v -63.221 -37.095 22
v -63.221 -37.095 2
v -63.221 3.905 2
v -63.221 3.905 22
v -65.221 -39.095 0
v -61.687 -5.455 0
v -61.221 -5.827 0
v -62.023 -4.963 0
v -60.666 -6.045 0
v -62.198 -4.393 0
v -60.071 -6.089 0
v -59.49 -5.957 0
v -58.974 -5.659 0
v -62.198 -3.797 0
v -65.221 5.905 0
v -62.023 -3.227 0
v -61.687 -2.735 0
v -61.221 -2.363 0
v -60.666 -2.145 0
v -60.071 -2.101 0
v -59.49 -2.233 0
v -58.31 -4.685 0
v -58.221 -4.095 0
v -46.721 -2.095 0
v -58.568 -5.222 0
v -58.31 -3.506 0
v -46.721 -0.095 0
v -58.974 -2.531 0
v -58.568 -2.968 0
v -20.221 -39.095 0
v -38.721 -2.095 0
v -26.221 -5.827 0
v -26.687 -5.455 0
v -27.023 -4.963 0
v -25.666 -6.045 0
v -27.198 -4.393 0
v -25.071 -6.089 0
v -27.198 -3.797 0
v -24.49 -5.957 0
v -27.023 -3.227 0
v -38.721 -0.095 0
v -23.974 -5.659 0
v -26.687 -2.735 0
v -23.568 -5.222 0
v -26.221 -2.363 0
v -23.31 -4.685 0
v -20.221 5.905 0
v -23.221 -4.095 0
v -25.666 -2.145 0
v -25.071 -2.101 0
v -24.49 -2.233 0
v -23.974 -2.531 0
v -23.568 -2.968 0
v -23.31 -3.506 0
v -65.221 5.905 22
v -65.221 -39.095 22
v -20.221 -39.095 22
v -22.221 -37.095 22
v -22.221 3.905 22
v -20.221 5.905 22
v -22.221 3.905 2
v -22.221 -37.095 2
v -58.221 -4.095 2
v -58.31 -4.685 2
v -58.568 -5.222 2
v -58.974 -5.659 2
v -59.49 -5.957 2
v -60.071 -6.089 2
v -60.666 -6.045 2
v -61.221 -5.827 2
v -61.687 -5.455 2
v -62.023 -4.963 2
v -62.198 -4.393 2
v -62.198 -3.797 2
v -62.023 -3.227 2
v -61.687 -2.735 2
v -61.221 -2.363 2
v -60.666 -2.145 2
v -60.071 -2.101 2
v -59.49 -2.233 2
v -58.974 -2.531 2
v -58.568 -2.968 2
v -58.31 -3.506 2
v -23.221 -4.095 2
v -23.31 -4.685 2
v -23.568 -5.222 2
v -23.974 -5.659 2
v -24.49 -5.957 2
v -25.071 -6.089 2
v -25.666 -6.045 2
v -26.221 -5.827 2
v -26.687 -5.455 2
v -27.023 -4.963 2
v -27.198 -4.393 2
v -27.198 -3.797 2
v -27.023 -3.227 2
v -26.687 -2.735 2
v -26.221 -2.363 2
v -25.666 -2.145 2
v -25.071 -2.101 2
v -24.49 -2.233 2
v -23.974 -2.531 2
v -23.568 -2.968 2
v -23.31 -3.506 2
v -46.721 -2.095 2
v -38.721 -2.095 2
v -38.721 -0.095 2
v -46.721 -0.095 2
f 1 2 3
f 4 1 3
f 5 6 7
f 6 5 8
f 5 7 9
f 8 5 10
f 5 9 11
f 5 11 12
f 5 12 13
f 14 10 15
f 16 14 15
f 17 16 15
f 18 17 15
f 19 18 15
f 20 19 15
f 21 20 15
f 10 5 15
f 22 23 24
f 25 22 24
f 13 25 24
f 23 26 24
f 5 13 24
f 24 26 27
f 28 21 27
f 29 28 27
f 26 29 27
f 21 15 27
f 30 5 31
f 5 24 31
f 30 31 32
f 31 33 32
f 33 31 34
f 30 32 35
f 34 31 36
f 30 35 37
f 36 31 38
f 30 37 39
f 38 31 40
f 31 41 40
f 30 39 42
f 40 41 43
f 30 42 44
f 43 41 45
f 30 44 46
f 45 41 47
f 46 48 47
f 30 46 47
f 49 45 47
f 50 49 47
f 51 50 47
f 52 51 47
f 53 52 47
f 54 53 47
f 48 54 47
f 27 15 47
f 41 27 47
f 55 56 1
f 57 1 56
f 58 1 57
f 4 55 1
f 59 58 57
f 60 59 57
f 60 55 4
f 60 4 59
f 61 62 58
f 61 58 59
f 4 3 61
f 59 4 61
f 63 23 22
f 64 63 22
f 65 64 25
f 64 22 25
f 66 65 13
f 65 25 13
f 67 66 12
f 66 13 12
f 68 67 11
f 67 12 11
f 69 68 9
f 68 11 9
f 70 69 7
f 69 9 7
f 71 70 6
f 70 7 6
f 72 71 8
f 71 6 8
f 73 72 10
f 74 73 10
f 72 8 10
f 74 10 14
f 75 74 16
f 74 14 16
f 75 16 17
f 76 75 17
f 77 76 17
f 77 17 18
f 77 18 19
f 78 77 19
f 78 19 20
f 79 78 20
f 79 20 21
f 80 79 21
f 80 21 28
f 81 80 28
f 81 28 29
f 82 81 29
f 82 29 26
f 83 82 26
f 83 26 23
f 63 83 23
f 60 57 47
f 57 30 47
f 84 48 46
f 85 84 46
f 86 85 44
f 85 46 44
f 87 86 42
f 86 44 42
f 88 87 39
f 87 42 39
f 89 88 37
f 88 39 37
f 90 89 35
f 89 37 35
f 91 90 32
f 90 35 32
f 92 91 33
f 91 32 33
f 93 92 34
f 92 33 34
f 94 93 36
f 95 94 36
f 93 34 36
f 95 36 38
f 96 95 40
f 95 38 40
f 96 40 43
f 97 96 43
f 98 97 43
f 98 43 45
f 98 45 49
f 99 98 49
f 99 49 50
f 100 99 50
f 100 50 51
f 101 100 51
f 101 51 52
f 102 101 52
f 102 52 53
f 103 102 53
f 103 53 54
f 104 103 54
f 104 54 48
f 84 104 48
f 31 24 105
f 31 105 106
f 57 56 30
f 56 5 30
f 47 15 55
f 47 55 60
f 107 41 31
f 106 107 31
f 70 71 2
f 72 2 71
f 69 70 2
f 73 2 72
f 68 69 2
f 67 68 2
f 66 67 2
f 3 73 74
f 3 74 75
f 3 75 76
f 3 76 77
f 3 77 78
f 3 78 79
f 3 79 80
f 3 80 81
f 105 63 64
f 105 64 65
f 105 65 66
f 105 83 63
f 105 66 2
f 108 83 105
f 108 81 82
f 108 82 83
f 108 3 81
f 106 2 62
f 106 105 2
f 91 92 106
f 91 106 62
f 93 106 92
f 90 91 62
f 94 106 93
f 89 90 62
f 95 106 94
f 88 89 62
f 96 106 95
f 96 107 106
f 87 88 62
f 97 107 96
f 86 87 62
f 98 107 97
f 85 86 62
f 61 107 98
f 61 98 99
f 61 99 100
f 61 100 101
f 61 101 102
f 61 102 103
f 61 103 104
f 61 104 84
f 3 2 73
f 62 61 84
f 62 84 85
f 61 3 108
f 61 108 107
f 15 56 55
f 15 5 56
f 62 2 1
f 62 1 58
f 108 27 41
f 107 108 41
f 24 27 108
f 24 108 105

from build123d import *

# Parameters (mm, degrees)
F0_W     = 45
F0_H     = 45
F1_DEPTH = 2
F2_W     = 45
F2_H     = 45
F2_W_2   = 41
F2_H_2   = 41
F3_DEPTH = 20
F4_W     = 8
F4_H     = 2
F5_DEPTH = 2
F6_R     = 2
F7_DEPTH = 25


with BuildPart() as f1:
    # F0 (on Top) → F1 (new body)
    with BuildSketch(Plane.XY):
        with Locations((-42.720676, -16.595085)):
            Rectangle(F0_W, F0_H)
    extrude(amount=F1_DEPTH)

    # F2 (on face) → F3 (join)
    with BuildSketch(Plane.XY.offset(2)):
        with Locations((-42.720676, -16.595085)):
            Rectangle(F2_W, F2_H)
        with Locations((-42.720676, -16.595085)):
            Rectangle(F2_W_2, F2_H_2, mode=Mode.SUBTRACT)
    extrude(amount=F3_DEPTH)

    # F4 (on face) → F5 (cut, through all)
    with BuildSketch(Plane(origin=(0, 0, 0), x_dir=(1, 0, 0), z_dir=(0, 0, -1))):
        with Locations((-42.720676, 1.095085)):
            Rectangle(F4_W, F4_H)
    extrude(amount=-F5_DEPTH, mode=Mode.SUBTRACT)

    # F6 (on face) → F7 (cut)
    with BuildSketch(Plane(origin=(0, 0, 0), x_dir=(1, 0, 0), z_dir=(0, 0, -1))):
        with Locations((-25.220676, 4.095085)):
            Circle(F6_R)
        with Locations((-60.220676, 4.095085)):
            Circle(F6_R)
    extrude(amount=-F7_DEPTH, mode=Mode.SUBTRACT)


solid = f1.part
